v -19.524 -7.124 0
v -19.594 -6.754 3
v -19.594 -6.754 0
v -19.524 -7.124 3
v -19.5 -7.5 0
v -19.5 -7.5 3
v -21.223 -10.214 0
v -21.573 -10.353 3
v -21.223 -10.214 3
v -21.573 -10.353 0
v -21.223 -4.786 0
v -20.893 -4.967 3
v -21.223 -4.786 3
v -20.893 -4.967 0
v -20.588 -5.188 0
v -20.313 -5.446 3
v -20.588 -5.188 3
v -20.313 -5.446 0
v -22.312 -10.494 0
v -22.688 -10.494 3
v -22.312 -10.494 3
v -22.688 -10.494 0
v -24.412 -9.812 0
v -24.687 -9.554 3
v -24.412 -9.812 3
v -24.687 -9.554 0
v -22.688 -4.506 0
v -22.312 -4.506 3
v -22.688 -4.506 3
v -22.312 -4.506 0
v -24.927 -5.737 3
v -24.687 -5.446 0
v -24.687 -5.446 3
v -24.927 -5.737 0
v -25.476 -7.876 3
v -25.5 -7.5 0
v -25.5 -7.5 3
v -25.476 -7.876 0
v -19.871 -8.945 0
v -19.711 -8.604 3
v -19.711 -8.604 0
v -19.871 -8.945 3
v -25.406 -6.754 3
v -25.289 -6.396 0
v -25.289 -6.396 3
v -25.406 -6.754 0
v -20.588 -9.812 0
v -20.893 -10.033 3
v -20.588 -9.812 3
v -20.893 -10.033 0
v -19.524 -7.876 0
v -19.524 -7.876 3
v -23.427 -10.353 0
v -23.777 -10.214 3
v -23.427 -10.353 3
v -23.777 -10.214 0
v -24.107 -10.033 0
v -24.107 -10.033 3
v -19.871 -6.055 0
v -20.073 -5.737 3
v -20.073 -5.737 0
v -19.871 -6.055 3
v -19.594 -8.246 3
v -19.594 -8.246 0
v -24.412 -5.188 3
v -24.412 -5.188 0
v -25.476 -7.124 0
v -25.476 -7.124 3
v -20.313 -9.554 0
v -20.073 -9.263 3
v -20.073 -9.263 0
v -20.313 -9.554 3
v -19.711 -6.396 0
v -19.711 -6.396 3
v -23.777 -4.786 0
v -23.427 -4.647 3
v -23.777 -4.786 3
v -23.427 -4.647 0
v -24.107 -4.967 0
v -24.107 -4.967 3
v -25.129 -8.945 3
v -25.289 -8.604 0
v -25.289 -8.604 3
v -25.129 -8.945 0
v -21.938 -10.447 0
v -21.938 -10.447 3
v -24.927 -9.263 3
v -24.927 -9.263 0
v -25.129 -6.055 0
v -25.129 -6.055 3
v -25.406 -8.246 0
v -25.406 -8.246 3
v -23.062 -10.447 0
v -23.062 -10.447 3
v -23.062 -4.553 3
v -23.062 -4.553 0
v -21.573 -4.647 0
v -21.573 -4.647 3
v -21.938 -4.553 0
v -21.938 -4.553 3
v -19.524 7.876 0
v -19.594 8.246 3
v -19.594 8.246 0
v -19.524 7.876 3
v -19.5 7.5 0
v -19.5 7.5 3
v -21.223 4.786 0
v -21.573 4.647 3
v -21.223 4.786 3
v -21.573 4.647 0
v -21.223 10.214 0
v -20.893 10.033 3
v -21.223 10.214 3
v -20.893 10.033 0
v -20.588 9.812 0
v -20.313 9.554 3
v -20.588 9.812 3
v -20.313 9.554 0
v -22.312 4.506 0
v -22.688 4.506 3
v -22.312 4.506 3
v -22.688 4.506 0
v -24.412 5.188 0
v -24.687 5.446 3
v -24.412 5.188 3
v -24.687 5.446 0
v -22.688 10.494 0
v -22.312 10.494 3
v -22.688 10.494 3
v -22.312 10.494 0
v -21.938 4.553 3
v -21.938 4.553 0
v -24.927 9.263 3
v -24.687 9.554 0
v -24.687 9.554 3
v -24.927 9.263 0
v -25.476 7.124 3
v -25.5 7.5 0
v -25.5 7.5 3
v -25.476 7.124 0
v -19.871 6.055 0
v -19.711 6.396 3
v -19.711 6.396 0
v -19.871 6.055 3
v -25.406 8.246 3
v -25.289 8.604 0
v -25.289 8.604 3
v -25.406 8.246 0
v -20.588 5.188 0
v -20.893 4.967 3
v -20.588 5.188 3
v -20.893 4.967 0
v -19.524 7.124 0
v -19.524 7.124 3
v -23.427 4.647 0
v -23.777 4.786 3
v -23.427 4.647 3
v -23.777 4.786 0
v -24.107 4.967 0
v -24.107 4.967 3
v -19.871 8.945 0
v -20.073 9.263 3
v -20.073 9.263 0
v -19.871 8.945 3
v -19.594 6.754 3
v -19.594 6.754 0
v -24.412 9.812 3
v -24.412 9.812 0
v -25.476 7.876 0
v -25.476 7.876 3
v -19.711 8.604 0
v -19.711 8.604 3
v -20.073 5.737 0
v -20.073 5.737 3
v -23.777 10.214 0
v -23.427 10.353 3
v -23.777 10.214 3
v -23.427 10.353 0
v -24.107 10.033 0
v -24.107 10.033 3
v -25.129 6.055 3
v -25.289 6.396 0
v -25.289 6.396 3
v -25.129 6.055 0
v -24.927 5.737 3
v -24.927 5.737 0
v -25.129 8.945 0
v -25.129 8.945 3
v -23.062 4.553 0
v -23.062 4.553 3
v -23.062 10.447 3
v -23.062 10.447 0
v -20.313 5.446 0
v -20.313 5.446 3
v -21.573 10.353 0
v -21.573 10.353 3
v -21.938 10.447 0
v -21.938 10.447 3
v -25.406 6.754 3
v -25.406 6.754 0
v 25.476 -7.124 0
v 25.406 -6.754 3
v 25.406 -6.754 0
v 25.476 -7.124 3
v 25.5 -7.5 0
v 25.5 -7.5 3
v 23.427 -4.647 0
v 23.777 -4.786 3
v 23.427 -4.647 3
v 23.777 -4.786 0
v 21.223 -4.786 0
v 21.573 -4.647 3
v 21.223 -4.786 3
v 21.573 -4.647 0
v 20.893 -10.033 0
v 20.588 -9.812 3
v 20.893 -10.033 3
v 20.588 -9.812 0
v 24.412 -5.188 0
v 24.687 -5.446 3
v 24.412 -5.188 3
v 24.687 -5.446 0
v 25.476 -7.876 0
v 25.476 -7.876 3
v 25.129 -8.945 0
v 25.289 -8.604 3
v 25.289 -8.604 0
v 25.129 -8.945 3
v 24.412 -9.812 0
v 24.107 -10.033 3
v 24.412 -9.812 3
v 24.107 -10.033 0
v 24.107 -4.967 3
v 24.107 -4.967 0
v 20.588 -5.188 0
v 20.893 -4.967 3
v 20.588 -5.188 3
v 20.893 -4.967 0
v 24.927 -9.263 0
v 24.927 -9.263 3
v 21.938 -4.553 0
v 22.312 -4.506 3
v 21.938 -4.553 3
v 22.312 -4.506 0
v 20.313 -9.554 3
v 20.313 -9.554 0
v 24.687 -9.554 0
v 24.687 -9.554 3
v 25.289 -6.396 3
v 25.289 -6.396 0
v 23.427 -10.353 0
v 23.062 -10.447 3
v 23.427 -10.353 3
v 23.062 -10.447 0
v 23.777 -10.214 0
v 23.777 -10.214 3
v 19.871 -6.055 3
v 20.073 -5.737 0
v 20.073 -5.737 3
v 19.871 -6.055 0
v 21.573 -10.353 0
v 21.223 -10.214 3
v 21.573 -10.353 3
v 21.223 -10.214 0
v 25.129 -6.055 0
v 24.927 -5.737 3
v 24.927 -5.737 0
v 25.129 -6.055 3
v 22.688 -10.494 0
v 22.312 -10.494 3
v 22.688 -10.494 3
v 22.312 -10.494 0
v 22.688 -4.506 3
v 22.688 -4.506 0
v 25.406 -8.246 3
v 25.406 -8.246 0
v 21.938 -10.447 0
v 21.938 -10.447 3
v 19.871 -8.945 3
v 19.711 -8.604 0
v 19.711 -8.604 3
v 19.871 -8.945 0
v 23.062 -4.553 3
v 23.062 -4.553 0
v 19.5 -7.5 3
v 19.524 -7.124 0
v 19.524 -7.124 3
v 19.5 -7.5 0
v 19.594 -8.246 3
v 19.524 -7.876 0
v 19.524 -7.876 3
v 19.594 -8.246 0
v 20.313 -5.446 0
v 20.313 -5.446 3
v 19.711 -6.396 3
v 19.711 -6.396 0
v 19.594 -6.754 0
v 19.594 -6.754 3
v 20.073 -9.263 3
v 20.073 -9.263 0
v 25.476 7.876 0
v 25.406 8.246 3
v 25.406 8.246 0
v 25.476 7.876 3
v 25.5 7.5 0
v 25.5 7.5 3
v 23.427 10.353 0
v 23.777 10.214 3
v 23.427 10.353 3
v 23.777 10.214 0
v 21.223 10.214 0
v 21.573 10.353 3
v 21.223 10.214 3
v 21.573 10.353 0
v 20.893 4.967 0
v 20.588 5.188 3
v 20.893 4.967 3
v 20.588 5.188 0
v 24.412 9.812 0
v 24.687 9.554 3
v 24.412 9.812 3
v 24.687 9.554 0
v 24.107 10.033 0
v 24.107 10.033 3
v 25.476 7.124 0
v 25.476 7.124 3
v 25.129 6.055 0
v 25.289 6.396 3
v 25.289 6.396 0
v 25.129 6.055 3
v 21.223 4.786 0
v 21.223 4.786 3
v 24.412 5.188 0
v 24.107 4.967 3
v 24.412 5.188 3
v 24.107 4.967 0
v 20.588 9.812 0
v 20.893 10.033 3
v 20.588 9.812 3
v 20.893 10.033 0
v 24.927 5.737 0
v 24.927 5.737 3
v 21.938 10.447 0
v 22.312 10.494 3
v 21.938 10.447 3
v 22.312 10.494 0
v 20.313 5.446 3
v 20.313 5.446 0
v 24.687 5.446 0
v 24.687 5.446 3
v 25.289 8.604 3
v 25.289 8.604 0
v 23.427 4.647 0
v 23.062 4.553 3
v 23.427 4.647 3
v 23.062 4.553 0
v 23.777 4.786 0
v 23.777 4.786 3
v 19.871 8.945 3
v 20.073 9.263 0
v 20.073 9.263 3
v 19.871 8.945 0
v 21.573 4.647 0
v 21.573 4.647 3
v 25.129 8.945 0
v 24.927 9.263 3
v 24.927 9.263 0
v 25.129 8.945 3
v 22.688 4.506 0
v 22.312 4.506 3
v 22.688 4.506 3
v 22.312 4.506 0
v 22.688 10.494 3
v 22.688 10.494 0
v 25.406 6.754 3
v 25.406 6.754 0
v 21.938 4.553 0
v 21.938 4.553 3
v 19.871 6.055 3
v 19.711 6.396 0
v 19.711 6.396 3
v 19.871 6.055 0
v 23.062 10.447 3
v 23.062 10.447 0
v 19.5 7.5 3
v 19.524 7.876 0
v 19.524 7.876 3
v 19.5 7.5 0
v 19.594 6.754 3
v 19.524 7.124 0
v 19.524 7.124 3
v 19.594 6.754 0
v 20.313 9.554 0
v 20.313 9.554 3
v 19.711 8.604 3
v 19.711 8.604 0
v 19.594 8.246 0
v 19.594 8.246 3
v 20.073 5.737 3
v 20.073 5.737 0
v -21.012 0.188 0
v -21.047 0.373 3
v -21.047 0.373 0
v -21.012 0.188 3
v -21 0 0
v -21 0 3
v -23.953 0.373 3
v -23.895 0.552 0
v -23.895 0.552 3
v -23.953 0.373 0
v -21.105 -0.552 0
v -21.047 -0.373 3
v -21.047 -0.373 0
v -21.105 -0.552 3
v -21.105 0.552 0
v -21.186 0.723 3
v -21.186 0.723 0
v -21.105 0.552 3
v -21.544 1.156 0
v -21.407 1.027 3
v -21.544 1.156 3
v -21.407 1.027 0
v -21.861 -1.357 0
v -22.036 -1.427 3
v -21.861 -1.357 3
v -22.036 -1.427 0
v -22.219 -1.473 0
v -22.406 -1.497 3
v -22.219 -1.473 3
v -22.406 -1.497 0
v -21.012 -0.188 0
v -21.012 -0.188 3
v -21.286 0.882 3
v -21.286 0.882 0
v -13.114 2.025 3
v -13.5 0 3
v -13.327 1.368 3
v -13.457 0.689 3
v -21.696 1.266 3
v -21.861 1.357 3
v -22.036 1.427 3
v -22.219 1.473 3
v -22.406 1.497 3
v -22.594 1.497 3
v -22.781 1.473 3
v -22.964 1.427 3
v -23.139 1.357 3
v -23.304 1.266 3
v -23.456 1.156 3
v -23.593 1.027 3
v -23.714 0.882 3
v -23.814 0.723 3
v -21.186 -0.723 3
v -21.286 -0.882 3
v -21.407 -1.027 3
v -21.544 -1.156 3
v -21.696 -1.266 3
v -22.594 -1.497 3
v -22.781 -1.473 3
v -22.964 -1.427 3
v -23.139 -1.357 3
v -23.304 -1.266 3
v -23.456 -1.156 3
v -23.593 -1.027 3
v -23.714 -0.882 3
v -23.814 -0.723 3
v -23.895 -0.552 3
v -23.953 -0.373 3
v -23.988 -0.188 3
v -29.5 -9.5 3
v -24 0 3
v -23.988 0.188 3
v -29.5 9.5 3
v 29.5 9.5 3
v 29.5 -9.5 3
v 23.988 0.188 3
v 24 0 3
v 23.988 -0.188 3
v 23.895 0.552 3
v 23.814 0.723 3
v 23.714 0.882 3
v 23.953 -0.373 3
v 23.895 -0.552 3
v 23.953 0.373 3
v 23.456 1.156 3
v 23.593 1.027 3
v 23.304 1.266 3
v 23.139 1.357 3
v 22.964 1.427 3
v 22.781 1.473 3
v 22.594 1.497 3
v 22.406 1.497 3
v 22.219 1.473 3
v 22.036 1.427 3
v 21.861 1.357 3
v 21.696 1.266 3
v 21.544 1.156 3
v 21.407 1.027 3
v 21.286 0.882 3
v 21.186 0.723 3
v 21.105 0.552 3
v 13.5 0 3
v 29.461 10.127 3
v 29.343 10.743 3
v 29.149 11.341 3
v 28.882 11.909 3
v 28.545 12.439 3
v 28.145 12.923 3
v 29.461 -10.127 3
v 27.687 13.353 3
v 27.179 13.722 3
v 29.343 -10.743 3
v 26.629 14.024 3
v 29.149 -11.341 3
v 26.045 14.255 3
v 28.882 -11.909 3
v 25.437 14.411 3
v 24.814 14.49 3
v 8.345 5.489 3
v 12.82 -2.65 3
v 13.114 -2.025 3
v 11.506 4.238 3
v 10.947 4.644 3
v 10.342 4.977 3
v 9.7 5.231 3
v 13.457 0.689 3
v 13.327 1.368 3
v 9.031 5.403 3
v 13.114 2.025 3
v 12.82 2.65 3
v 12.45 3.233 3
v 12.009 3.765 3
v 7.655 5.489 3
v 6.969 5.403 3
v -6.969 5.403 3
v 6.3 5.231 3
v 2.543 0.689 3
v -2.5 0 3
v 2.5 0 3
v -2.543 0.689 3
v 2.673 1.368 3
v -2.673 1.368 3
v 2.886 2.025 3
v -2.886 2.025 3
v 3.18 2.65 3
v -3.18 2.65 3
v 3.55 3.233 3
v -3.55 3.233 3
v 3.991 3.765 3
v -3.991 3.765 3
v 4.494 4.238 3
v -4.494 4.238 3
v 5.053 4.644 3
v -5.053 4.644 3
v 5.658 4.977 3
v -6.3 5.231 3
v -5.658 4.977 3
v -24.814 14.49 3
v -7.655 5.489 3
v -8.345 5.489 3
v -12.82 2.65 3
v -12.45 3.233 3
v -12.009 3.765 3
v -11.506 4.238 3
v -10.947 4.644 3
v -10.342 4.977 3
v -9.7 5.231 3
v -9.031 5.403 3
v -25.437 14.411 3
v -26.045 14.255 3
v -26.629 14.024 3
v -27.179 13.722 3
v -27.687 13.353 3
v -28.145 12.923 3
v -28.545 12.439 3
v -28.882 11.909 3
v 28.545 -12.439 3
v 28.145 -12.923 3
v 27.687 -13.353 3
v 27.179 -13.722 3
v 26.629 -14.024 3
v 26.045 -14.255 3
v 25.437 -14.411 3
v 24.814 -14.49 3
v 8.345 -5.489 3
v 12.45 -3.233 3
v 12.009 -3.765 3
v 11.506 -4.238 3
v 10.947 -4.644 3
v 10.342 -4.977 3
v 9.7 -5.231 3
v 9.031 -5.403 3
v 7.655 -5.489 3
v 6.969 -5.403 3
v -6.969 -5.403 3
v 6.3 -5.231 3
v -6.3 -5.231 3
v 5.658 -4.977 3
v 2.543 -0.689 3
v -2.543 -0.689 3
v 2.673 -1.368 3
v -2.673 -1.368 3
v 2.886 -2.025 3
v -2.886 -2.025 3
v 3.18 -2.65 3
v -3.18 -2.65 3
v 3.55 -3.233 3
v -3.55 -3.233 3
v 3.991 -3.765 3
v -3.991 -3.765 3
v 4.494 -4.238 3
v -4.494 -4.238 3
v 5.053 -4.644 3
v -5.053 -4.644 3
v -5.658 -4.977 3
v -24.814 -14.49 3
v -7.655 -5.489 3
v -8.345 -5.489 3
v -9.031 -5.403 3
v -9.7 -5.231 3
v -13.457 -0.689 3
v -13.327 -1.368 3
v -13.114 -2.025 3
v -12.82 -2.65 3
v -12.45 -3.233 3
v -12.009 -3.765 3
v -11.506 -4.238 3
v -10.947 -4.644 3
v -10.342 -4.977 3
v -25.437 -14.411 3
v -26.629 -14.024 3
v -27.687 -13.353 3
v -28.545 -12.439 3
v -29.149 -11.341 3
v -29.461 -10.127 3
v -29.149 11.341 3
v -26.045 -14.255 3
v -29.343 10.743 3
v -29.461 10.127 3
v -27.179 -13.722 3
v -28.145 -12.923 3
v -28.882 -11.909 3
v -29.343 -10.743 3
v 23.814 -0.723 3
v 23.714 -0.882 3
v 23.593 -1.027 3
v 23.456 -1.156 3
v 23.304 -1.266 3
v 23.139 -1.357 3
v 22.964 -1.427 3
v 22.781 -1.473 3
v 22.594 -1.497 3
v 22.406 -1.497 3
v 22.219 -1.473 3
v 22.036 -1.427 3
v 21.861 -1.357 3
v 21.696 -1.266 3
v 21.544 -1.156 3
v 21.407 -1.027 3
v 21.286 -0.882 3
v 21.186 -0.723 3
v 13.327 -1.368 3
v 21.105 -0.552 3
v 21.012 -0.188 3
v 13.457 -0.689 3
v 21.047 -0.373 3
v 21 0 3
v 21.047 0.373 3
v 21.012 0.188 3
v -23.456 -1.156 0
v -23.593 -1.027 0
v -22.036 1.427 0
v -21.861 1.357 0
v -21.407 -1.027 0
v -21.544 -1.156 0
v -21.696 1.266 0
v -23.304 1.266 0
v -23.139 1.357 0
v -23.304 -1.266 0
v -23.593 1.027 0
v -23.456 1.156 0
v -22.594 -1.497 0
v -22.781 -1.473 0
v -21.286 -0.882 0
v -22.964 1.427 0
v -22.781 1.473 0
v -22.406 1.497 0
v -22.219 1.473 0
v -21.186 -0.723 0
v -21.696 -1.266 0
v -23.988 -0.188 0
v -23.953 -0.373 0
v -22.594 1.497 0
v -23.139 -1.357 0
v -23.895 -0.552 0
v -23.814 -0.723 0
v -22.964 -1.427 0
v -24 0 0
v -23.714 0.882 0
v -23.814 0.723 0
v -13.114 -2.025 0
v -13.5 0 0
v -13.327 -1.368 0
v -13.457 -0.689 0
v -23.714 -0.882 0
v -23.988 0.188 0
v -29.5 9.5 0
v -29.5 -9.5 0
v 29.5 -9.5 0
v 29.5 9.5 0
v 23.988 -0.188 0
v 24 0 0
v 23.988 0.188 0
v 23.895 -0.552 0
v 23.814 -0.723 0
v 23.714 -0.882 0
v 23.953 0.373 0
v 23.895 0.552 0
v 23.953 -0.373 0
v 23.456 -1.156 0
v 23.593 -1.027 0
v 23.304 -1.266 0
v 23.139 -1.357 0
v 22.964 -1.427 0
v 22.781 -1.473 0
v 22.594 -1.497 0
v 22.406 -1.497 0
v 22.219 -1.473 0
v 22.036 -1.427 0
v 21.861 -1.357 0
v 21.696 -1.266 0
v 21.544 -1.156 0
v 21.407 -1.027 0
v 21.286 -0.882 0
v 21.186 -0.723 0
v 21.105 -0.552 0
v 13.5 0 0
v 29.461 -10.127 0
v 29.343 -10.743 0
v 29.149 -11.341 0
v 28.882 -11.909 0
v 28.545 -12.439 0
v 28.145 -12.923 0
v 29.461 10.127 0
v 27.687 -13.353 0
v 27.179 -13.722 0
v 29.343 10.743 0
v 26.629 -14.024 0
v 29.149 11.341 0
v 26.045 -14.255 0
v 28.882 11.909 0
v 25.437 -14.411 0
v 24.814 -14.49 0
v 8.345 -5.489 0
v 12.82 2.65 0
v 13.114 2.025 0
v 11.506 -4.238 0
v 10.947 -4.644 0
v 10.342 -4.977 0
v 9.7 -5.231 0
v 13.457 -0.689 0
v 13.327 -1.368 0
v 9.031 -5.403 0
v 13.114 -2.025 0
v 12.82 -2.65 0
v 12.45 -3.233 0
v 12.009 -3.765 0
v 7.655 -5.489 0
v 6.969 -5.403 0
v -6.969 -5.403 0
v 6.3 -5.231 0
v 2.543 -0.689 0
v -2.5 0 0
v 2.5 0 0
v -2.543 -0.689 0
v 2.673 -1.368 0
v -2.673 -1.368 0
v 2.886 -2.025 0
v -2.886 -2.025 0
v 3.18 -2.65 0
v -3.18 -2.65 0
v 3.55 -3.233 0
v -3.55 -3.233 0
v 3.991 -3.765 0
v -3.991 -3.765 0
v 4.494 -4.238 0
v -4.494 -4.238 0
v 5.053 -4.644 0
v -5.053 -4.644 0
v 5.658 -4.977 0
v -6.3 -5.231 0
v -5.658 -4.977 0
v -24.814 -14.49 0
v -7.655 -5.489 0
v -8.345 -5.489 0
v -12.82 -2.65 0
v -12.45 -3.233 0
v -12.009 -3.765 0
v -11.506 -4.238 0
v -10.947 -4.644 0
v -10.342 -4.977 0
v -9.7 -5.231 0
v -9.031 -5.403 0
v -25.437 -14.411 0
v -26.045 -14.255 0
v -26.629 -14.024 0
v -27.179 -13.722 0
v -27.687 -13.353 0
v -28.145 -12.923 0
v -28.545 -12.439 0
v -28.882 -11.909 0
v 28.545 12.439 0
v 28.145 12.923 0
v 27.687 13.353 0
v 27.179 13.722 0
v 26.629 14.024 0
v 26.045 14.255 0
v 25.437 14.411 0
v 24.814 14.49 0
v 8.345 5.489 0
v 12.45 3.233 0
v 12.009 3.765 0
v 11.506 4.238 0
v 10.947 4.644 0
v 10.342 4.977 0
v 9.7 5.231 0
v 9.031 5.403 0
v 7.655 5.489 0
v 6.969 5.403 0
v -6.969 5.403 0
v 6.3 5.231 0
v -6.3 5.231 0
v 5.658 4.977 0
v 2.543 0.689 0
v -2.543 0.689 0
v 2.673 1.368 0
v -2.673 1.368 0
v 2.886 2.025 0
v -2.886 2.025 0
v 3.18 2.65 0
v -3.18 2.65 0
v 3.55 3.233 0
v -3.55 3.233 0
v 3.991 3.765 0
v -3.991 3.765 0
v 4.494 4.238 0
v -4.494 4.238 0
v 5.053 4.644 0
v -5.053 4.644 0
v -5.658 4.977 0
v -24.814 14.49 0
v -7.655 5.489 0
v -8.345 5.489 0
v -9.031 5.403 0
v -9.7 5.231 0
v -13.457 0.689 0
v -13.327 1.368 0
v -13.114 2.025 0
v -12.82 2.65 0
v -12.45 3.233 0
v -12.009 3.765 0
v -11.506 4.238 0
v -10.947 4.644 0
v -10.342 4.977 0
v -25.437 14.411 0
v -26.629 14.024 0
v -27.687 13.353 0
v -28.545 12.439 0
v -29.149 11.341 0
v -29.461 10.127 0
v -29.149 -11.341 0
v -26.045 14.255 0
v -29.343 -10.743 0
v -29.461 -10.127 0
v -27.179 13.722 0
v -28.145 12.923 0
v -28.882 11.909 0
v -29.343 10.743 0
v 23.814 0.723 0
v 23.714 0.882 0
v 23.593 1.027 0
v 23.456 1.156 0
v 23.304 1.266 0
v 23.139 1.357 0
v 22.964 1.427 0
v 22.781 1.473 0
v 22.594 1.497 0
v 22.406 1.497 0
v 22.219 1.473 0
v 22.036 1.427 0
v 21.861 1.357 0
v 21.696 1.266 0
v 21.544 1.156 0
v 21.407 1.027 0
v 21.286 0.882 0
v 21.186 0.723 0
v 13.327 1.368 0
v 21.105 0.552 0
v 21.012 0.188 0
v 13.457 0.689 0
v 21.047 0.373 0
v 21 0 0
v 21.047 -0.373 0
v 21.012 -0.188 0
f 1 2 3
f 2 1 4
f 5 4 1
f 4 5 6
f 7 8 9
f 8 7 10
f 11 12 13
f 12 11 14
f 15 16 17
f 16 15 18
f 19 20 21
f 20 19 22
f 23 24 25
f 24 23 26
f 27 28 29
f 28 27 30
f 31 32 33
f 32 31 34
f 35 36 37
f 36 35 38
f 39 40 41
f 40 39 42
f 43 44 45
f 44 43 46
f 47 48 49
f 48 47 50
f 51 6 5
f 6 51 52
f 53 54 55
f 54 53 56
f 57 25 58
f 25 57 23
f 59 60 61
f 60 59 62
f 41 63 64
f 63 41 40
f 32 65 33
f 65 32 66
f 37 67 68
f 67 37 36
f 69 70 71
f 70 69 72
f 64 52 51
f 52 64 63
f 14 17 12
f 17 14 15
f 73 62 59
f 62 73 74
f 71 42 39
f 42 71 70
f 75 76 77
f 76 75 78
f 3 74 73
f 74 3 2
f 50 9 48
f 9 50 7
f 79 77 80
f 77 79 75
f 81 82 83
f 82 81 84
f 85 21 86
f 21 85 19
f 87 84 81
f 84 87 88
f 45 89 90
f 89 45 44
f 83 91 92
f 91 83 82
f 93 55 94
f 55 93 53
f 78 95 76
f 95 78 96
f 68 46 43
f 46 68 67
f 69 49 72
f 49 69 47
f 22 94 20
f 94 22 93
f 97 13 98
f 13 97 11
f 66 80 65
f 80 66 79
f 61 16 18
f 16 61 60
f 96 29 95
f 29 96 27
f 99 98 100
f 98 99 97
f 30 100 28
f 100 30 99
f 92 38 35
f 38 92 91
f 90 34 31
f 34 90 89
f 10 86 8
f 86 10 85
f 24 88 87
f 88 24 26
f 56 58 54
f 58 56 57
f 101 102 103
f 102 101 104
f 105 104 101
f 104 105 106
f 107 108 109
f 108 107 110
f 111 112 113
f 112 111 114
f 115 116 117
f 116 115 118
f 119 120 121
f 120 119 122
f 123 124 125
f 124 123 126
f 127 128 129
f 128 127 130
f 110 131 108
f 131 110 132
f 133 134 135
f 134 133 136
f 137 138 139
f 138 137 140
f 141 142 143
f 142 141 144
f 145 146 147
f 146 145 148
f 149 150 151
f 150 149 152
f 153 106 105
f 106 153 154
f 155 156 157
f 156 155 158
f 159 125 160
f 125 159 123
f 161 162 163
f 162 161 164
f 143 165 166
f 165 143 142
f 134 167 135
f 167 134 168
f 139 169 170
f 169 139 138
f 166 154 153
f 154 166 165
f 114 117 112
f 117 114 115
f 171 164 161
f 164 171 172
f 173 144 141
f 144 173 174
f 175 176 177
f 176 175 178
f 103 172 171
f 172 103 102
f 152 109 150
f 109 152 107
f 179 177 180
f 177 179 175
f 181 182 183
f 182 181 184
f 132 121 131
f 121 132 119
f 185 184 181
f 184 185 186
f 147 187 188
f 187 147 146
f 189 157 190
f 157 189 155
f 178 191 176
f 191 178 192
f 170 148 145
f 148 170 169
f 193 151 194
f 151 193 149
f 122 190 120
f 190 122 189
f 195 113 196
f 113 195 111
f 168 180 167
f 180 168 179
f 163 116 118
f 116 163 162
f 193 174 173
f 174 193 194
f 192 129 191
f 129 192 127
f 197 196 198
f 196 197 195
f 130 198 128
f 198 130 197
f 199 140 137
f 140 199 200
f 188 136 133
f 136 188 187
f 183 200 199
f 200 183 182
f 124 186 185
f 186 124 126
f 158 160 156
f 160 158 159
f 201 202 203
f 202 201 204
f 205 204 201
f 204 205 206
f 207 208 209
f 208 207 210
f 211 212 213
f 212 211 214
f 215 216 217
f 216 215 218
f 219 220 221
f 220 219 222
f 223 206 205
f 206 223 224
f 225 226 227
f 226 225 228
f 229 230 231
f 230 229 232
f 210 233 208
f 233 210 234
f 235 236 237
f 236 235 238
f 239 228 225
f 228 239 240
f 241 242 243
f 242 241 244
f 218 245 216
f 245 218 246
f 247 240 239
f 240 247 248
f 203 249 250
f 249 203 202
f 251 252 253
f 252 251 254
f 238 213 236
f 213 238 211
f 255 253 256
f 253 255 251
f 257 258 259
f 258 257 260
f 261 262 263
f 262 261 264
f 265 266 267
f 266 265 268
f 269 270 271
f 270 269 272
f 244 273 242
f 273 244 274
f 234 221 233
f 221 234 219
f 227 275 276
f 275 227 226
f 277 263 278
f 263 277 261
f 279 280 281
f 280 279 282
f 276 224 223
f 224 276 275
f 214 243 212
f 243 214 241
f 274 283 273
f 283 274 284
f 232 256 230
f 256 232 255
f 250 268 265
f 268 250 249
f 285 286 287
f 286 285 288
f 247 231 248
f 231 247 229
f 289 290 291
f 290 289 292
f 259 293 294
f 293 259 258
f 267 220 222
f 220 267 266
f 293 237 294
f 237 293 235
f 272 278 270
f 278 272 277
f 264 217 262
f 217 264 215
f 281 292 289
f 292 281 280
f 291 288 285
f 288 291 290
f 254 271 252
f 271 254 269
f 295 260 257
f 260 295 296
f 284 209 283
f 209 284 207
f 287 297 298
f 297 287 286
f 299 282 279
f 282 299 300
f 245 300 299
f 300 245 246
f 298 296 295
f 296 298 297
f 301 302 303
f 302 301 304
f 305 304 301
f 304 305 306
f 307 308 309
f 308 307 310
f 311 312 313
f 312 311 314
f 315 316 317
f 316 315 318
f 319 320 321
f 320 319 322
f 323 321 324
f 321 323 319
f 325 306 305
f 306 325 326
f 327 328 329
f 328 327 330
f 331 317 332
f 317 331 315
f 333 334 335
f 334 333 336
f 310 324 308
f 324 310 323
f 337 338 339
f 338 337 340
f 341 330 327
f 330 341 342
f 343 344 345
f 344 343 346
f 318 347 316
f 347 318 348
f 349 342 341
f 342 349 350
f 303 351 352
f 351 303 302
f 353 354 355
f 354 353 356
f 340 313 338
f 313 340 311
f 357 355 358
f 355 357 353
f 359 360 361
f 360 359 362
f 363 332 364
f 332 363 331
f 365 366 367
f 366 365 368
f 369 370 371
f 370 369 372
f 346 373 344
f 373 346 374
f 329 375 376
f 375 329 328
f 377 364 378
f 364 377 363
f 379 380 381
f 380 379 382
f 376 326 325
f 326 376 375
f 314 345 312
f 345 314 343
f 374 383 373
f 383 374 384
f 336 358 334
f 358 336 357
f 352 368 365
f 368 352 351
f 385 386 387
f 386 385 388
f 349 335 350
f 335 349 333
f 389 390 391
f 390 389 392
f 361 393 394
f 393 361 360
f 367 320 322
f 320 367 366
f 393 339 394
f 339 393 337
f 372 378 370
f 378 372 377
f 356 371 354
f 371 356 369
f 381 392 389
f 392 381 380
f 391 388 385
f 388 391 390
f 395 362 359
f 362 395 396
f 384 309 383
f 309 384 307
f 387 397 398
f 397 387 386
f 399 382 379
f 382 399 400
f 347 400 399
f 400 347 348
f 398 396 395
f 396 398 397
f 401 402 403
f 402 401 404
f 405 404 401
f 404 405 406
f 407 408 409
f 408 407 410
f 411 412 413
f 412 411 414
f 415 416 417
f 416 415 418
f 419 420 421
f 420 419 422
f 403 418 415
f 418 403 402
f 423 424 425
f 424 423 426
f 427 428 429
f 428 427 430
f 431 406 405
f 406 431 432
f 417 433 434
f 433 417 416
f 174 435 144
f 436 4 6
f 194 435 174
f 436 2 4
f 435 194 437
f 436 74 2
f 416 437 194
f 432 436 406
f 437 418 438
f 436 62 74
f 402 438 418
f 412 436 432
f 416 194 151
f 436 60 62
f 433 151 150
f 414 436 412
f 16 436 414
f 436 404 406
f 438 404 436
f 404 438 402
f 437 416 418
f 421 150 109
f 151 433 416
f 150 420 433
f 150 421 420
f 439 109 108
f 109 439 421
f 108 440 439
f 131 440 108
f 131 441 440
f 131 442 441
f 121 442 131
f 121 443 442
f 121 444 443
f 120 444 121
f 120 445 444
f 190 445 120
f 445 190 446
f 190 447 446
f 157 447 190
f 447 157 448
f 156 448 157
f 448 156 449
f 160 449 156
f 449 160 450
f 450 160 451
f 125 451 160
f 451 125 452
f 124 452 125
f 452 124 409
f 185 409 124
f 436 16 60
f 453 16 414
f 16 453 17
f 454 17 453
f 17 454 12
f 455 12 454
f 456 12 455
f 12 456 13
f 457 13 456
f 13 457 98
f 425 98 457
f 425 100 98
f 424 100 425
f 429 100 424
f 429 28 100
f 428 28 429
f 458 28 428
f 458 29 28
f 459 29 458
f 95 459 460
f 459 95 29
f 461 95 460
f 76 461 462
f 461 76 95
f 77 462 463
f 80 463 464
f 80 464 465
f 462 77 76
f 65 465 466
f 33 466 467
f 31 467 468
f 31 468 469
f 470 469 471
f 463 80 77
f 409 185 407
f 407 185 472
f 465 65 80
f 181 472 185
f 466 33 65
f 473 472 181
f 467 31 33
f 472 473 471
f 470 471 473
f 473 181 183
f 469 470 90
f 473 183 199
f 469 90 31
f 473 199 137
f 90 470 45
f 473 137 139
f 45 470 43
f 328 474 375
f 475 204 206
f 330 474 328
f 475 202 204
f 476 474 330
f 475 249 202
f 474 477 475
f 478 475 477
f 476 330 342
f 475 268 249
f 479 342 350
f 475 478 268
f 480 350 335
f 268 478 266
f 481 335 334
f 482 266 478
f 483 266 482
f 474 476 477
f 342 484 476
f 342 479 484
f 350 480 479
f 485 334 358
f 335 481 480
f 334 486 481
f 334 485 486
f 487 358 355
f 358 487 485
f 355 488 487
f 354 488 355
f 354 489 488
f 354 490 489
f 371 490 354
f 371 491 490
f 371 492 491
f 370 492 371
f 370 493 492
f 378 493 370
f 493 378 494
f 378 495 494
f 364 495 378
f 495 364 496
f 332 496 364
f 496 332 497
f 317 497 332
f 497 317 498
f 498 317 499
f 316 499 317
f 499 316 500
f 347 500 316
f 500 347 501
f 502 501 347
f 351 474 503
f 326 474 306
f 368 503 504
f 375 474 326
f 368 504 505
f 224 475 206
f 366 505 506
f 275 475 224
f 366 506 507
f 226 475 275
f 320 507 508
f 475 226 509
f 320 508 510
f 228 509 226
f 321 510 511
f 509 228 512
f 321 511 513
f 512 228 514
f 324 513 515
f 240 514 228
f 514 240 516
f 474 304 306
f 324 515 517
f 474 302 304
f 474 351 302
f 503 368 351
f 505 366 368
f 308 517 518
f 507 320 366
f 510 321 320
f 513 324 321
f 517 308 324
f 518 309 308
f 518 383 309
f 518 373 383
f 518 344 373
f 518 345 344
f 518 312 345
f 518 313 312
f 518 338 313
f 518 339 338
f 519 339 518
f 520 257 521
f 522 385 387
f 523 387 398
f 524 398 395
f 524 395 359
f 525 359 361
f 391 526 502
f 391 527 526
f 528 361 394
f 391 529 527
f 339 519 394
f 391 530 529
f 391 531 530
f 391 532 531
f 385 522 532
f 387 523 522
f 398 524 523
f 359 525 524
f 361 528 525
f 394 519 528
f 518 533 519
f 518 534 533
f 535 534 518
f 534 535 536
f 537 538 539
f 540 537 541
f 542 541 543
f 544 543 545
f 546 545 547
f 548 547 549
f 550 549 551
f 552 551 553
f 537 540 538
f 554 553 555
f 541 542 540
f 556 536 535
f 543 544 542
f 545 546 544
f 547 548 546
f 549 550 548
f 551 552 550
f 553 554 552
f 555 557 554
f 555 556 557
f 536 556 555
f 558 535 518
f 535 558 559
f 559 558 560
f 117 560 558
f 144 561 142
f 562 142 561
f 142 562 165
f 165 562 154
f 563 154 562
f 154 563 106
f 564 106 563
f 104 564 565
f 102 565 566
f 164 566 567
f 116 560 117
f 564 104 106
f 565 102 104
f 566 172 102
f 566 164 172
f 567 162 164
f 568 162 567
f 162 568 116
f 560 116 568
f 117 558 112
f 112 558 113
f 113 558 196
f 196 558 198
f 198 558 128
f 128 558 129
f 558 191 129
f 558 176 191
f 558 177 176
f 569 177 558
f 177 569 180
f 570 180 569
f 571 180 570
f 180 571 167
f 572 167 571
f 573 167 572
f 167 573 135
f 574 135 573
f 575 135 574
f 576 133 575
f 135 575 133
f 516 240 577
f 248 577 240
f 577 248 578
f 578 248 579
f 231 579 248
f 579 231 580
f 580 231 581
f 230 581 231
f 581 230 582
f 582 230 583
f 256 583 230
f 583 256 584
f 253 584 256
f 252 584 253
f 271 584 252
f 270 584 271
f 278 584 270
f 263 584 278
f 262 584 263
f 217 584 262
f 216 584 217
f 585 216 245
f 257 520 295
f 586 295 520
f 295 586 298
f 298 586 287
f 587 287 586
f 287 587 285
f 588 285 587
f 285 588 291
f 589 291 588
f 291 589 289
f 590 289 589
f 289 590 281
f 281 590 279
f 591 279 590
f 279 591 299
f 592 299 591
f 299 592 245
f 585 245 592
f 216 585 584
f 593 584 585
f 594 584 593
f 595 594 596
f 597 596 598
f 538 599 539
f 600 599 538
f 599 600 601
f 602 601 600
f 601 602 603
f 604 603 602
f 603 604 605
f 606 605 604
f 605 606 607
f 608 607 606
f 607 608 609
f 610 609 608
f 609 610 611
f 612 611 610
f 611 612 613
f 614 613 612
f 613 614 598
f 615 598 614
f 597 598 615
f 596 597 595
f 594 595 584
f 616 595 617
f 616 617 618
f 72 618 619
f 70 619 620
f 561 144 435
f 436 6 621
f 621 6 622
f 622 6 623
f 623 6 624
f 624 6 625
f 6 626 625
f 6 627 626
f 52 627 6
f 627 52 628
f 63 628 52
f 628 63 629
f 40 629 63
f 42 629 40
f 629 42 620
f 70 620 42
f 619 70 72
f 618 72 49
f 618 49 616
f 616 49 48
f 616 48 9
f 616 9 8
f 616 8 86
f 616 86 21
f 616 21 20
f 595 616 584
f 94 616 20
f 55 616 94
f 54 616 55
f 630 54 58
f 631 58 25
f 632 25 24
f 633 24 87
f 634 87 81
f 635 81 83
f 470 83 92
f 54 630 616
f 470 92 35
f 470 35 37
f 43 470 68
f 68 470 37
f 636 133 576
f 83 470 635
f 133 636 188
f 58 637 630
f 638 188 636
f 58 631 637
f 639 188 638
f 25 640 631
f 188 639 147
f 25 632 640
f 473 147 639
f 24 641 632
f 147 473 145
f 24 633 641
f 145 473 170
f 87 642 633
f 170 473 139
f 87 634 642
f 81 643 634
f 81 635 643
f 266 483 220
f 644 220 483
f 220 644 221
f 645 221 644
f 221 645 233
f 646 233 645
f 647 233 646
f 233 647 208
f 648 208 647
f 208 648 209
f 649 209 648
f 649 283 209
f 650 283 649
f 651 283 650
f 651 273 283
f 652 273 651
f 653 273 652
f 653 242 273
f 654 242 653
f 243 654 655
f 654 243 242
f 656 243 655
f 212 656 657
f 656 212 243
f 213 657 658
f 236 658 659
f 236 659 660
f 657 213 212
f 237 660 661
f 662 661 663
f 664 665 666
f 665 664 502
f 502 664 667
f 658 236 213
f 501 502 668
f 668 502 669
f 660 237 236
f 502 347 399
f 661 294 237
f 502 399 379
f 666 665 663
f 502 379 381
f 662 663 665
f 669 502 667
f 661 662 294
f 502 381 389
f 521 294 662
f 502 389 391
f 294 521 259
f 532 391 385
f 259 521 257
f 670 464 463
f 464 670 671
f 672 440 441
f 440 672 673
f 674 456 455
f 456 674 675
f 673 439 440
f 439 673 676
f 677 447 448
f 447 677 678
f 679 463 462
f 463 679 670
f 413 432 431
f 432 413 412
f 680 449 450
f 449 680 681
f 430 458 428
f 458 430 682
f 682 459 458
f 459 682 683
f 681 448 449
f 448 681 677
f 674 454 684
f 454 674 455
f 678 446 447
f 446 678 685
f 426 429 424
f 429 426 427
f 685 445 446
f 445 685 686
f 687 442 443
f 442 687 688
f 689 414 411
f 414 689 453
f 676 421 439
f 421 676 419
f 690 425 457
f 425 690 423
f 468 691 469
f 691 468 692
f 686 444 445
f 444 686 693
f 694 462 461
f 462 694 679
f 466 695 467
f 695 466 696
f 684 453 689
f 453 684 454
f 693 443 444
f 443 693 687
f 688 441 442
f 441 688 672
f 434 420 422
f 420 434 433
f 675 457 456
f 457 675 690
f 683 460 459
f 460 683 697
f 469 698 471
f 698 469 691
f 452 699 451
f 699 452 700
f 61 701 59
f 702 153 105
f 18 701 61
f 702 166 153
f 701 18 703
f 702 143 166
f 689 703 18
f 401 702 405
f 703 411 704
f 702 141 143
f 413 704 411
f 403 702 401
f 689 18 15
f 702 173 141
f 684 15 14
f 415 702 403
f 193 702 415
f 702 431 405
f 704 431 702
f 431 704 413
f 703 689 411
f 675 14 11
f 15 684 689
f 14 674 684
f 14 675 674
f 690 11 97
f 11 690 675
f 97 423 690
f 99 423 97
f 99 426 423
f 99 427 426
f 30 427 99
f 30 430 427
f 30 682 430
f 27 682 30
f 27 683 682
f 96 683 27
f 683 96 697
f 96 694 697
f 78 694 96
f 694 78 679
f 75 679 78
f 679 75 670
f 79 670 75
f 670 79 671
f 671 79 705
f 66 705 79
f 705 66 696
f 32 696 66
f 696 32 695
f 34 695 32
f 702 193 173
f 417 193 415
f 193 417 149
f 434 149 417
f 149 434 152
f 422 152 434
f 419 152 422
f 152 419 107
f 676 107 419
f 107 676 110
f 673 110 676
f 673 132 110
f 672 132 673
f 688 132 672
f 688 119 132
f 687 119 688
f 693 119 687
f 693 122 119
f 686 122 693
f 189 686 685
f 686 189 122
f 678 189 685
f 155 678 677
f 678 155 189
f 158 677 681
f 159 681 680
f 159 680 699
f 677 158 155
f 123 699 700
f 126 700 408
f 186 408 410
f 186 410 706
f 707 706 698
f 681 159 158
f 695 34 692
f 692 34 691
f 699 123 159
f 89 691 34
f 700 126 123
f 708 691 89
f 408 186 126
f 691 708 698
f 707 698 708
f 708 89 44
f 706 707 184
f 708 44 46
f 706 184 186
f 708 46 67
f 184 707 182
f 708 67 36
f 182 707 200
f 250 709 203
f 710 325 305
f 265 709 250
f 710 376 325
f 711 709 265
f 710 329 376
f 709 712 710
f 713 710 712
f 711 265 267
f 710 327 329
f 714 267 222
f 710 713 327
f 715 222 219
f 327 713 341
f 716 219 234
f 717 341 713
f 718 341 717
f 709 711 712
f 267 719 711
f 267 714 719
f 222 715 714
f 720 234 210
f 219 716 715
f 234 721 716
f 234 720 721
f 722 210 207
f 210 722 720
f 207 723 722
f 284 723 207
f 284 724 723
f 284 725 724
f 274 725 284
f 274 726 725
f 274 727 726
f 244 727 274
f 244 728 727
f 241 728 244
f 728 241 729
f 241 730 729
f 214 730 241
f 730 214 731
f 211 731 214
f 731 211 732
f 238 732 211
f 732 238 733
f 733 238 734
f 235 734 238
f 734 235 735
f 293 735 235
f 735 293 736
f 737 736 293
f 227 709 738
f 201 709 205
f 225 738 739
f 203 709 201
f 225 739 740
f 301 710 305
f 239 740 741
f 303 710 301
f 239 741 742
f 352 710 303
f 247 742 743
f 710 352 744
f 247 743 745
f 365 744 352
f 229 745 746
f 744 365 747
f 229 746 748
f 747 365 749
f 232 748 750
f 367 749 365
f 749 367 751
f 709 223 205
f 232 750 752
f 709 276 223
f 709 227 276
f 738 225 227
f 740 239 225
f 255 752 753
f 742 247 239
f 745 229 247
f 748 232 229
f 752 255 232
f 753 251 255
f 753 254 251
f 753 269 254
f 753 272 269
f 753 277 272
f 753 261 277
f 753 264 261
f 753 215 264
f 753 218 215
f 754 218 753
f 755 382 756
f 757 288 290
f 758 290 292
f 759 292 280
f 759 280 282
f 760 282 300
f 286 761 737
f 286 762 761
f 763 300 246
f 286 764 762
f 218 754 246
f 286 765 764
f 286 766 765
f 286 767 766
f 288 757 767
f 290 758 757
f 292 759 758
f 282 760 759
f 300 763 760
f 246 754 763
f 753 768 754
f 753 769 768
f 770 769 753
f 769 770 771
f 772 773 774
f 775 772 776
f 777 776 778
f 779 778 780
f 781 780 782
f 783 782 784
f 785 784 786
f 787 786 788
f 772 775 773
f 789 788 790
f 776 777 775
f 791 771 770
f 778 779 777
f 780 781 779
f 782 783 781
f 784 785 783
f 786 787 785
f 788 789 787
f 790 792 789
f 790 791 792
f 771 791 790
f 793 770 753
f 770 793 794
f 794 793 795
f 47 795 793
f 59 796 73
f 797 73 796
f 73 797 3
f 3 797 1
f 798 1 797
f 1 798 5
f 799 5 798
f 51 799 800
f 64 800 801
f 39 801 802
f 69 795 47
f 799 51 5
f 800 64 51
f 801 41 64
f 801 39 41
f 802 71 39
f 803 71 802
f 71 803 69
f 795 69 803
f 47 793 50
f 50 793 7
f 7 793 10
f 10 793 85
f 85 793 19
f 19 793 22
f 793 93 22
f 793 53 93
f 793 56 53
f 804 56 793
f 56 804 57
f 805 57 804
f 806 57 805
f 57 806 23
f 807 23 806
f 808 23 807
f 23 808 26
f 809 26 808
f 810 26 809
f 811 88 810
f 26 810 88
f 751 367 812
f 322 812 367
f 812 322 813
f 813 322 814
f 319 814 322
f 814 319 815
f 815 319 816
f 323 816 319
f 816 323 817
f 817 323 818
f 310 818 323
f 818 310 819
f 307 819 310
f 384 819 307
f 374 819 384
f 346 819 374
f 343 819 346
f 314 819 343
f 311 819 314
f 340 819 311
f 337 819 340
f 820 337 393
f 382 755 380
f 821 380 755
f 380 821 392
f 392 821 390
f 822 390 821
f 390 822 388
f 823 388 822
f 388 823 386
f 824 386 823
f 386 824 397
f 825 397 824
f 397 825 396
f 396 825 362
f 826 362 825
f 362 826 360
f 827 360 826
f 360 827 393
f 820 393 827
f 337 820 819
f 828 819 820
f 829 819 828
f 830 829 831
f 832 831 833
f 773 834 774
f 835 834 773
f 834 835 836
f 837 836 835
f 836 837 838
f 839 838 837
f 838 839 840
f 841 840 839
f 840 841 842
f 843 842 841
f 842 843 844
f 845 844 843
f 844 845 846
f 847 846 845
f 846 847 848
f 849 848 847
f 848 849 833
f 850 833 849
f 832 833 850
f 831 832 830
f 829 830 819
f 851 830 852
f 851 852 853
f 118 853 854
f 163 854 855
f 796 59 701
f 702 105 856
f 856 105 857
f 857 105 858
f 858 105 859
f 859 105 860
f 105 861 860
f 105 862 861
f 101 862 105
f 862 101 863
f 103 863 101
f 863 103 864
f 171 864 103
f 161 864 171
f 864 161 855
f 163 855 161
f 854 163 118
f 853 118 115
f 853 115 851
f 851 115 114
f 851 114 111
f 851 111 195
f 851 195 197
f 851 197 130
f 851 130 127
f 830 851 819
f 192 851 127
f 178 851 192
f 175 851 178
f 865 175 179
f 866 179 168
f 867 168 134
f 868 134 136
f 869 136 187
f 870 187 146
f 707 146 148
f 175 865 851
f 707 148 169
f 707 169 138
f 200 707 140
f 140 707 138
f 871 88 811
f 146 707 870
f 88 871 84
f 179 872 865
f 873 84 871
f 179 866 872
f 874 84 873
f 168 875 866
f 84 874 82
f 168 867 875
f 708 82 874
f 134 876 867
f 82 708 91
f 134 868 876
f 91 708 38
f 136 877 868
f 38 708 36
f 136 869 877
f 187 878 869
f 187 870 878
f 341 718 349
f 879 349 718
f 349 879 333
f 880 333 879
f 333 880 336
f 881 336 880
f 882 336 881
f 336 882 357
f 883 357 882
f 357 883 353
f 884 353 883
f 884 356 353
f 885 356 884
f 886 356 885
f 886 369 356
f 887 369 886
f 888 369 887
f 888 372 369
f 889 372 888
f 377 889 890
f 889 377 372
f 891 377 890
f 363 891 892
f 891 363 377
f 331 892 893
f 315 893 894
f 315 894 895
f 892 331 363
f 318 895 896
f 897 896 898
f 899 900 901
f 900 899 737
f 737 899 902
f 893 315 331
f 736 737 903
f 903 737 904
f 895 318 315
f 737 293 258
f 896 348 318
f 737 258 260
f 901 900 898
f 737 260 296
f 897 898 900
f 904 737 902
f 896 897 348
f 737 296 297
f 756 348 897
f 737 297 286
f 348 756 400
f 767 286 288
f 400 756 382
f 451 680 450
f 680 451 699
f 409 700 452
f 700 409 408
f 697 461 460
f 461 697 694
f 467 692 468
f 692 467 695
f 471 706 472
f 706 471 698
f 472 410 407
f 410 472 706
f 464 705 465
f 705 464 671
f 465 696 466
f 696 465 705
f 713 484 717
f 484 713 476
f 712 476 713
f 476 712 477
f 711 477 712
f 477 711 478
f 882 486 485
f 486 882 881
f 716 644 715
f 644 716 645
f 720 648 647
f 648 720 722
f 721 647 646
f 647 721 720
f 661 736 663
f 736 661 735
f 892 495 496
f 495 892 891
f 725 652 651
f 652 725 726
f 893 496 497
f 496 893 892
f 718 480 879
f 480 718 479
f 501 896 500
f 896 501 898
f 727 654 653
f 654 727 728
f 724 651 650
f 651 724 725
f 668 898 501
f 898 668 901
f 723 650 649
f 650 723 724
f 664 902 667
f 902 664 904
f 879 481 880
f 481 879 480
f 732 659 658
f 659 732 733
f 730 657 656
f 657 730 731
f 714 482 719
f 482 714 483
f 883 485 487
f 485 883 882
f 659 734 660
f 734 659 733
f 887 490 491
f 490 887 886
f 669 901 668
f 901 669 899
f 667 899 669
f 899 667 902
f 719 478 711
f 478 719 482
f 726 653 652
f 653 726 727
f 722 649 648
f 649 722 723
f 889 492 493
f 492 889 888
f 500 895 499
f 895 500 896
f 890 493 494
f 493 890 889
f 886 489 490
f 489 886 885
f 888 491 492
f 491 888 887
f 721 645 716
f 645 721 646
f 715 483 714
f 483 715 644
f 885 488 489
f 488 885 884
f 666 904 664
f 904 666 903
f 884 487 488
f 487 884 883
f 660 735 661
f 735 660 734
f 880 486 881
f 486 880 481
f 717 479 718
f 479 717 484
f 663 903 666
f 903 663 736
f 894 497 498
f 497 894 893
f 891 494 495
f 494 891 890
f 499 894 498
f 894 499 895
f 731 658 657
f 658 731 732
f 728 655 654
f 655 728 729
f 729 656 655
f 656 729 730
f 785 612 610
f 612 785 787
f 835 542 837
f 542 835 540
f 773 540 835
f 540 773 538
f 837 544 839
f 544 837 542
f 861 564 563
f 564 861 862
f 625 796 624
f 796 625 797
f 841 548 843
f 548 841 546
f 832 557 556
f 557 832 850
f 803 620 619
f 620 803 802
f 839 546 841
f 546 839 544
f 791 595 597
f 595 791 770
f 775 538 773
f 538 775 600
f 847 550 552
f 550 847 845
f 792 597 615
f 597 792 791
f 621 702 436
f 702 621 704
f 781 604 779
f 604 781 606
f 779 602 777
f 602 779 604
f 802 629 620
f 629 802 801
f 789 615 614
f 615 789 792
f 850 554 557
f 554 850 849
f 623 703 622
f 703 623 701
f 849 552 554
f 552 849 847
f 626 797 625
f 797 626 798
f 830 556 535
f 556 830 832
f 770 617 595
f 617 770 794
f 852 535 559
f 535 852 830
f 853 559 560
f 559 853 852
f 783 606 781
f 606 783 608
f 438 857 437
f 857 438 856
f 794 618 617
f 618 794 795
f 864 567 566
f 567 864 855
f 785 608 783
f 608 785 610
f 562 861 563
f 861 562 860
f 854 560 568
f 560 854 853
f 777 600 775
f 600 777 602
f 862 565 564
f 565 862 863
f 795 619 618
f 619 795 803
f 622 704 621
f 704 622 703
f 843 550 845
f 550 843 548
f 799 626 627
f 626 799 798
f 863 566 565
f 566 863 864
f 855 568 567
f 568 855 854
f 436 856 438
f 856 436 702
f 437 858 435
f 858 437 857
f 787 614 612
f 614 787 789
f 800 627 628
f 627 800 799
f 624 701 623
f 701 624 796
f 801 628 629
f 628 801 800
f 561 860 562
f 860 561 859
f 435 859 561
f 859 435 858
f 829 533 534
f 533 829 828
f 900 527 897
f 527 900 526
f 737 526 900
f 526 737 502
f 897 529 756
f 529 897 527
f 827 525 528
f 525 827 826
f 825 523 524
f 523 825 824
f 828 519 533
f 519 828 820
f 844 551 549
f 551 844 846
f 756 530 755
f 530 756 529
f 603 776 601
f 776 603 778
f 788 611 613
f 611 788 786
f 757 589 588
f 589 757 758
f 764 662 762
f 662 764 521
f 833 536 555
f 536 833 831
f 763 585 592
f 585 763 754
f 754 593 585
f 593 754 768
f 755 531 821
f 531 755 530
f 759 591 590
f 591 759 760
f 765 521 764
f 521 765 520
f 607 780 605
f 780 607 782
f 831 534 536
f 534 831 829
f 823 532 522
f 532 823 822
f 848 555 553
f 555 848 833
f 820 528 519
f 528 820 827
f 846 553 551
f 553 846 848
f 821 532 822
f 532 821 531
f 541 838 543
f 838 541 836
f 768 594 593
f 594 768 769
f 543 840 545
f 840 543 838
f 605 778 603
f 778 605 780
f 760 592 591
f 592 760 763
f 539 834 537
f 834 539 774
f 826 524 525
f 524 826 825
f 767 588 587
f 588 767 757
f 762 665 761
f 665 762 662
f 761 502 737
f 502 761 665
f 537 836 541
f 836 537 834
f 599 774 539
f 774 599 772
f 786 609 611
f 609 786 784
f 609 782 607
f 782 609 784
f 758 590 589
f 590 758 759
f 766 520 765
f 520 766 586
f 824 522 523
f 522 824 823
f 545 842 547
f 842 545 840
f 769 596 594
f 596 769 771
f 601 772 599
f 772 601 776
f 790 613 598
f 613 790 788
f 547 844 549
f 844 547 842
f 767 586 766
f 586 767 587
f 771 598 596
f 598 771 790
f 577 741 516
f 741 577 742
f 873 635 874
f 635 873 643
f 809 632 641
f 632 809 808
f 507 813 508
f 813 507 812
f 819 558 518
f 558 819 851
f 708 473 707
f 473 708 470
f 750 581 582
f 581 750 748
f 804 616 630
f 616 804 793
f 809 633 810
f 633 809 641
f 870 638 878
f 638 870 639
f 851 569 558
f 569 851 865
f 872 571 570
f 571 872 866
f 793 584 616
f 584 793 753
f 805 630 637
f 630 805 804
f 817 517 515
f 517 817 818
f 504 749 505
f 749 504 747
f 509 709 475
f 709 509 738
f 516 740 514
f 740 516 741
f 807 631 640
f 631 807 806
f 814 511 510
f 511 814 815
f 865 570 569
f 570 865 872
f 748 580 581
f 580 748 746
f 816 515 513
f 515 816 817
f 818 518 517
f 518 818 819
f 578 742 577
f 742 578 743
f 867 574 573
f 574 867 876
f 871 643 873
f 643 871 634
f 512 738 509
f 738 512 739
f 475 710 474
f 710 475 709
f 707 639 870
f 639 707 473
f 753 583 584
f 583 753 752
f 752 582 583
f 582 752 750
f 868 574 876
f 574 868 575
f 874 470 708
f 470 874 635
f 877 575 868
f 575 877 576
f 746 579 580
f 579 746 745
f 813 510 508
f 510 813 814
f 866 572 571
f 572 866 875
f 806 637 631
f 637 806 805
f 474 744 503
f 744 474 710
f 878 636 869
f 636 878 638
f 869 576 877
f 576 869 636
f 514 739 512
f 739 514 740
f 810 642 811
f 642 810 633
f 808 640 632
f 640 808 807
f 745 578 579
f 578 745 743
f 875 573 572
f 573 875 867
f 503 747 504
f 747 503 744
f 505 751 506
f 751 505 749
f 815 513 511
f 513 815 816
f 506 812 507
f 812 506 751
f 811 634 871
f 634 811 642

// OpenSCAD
$fn = 50;


difference() {
	union() {
		hull() {
			translate(v = [-24.5000000000, 9.5000000000, 0]) {
				cylinder(h = 3, r = 5);
			}
			translate(v = [24.5000000000, 9.5000000000, 0]) {
				cylinder(h = 3, r = 5);
			}
			translate(v = [-24.5000000000, -9.5000000000, 0]) {
				cylinder(h = 3, r = 5);
			}
			translate(v = [24.5000000000, -9.5000000000, 0]) {
				cylinder(h = 3, r = 5);
			}
		}
	}
	union() {
		#translate(v = [-22.5000000000, -7.5000000000, 0]) {
			cylinder(h = 3, r = 3.0000000000);
		}
		#translate(v = [-22.5000000000, 7.5000000000, 0]) {
			cylinder(h = 3, r = 3.0000000000);
		}
		#translate(v = [22.5000000000, -7.5000000000, 0]) {
			cylinder(h = 3, r = 3.0000000000);
		}
		#translate(v = [22.5000000000, 7.5000000000, 0]) {
			cylinder(h = 3, r = 3.0000000000);
		}
		#translate(v = [-22.5000000000, -7.5000000000, -100.0000000000]) {
			cylinder(h = 200, r = 3.0000000000);
		}
		#translate(v = [-22.5000000000, 7.5000000000, -100.0000000000]) {
			cylinder(h = 200, r = 3.0000000000);
		}
		#translate(v = [22.5000000000, -7.5000000000, -100.0000000000]) {
			cylinder(h = 200, r = 3.0000000000);
		}
		#translate(v = [22.5000000000, 7.5000000000, -100.0000000000]) {
			cylinder(h = 200, r = 3.0000000000);
		}
		#translate(v = [-22.5000000000, -7.5000000000, 0]) {
			cylinder(h = 3, r = 1.5000000000);
		}
		#translate(v = [-22.5000000000, 0.0000000000, 0]) {
			cylinder(h = 3, r = 1.5000000000);
		}
		#translate(v = [-22.5000000000, 7.5000000000, 0]) {
			cylinder(h = 3, r = 1.5000000000);
		}
		#translate(v = [22.5000000000, -7.5000000000, 0]) {
			cylinder(h = 3, r = 1.5000000000);
		}
		#translate(v = [22.5000000000, 0.0000000000, 0]) {
			cylinder(h = 3, r = 1.5000000000);
		}
		#translate(v = [22.5000000000, 7.5000000000, 0]) {
			cylinder(h = 3, r = 1.5000000000);
		}
		#translate(v = [-22.5000000000, -7.5000000000, 0]) {
			cylinder(h = 3, r = 1.5000000000);
		}
		#translate(v = [-22.5000000000, 0.0000000000, 0]) {
			cylinder(h = 3, r = 1.5000000000);
		}
		#translate(v = [-22.5000000000, 7.5000000000, 0]) {
			cylinder(h = 3, r = 1.5000000000);
		}
		#translate(v = [22.5000000000, -7.5000000000, 0]) {
			cylinder(h = 3, r = 1.5000000000);
		}
		#translate(v = [22.5000000000, 0.0000000000, 0]) {
			cylinder(h = 3, r = 1.5000000000);
		}
		#translate(v = [22.5000000000, 7.5000000000, 0]) {
			cylinder(h = 3, r = 1.5000000000);
		}
		#translate(v = [-22.5000000000, -7.5000000000, 0]) {
			cylinder(h = 3, r = 1.5000000000);
		}
		#translate(v = [-22.5000000000, 0.0000000000, 0]) {
			cylinder(h = 3, r = 1.5000000000);
		}
		#translate(v = [-22.5000000000, 7.5000000000, 0]) {
			cylinder(h = 3, r = 1.5000000000);
		}
		#translate(v = [22.5000000000, -7.5000000000, 0]) {
			cylinder(h = 3, r = 1.5000000000);
		}
		#translate(v = [22.5000000000, 0.0000000000, 0]) {
			cylinder(h = 3, r = 1.5000000000);
		}
		#translate(v = [22.5000000000, 7.5000000000, 0]) {
			cylinder(h = 3, r = 1.5000000000);
		}
		#translate(v = [-8.0000000000, 0, 0]) {
			cylinder(h = 3, r = 5.5000000000);
		}
		#translate(v = [8.0000000000, 0, 0]) {
			cylinder(h = 3, r = 5.5000000000);
		}
	}
}
